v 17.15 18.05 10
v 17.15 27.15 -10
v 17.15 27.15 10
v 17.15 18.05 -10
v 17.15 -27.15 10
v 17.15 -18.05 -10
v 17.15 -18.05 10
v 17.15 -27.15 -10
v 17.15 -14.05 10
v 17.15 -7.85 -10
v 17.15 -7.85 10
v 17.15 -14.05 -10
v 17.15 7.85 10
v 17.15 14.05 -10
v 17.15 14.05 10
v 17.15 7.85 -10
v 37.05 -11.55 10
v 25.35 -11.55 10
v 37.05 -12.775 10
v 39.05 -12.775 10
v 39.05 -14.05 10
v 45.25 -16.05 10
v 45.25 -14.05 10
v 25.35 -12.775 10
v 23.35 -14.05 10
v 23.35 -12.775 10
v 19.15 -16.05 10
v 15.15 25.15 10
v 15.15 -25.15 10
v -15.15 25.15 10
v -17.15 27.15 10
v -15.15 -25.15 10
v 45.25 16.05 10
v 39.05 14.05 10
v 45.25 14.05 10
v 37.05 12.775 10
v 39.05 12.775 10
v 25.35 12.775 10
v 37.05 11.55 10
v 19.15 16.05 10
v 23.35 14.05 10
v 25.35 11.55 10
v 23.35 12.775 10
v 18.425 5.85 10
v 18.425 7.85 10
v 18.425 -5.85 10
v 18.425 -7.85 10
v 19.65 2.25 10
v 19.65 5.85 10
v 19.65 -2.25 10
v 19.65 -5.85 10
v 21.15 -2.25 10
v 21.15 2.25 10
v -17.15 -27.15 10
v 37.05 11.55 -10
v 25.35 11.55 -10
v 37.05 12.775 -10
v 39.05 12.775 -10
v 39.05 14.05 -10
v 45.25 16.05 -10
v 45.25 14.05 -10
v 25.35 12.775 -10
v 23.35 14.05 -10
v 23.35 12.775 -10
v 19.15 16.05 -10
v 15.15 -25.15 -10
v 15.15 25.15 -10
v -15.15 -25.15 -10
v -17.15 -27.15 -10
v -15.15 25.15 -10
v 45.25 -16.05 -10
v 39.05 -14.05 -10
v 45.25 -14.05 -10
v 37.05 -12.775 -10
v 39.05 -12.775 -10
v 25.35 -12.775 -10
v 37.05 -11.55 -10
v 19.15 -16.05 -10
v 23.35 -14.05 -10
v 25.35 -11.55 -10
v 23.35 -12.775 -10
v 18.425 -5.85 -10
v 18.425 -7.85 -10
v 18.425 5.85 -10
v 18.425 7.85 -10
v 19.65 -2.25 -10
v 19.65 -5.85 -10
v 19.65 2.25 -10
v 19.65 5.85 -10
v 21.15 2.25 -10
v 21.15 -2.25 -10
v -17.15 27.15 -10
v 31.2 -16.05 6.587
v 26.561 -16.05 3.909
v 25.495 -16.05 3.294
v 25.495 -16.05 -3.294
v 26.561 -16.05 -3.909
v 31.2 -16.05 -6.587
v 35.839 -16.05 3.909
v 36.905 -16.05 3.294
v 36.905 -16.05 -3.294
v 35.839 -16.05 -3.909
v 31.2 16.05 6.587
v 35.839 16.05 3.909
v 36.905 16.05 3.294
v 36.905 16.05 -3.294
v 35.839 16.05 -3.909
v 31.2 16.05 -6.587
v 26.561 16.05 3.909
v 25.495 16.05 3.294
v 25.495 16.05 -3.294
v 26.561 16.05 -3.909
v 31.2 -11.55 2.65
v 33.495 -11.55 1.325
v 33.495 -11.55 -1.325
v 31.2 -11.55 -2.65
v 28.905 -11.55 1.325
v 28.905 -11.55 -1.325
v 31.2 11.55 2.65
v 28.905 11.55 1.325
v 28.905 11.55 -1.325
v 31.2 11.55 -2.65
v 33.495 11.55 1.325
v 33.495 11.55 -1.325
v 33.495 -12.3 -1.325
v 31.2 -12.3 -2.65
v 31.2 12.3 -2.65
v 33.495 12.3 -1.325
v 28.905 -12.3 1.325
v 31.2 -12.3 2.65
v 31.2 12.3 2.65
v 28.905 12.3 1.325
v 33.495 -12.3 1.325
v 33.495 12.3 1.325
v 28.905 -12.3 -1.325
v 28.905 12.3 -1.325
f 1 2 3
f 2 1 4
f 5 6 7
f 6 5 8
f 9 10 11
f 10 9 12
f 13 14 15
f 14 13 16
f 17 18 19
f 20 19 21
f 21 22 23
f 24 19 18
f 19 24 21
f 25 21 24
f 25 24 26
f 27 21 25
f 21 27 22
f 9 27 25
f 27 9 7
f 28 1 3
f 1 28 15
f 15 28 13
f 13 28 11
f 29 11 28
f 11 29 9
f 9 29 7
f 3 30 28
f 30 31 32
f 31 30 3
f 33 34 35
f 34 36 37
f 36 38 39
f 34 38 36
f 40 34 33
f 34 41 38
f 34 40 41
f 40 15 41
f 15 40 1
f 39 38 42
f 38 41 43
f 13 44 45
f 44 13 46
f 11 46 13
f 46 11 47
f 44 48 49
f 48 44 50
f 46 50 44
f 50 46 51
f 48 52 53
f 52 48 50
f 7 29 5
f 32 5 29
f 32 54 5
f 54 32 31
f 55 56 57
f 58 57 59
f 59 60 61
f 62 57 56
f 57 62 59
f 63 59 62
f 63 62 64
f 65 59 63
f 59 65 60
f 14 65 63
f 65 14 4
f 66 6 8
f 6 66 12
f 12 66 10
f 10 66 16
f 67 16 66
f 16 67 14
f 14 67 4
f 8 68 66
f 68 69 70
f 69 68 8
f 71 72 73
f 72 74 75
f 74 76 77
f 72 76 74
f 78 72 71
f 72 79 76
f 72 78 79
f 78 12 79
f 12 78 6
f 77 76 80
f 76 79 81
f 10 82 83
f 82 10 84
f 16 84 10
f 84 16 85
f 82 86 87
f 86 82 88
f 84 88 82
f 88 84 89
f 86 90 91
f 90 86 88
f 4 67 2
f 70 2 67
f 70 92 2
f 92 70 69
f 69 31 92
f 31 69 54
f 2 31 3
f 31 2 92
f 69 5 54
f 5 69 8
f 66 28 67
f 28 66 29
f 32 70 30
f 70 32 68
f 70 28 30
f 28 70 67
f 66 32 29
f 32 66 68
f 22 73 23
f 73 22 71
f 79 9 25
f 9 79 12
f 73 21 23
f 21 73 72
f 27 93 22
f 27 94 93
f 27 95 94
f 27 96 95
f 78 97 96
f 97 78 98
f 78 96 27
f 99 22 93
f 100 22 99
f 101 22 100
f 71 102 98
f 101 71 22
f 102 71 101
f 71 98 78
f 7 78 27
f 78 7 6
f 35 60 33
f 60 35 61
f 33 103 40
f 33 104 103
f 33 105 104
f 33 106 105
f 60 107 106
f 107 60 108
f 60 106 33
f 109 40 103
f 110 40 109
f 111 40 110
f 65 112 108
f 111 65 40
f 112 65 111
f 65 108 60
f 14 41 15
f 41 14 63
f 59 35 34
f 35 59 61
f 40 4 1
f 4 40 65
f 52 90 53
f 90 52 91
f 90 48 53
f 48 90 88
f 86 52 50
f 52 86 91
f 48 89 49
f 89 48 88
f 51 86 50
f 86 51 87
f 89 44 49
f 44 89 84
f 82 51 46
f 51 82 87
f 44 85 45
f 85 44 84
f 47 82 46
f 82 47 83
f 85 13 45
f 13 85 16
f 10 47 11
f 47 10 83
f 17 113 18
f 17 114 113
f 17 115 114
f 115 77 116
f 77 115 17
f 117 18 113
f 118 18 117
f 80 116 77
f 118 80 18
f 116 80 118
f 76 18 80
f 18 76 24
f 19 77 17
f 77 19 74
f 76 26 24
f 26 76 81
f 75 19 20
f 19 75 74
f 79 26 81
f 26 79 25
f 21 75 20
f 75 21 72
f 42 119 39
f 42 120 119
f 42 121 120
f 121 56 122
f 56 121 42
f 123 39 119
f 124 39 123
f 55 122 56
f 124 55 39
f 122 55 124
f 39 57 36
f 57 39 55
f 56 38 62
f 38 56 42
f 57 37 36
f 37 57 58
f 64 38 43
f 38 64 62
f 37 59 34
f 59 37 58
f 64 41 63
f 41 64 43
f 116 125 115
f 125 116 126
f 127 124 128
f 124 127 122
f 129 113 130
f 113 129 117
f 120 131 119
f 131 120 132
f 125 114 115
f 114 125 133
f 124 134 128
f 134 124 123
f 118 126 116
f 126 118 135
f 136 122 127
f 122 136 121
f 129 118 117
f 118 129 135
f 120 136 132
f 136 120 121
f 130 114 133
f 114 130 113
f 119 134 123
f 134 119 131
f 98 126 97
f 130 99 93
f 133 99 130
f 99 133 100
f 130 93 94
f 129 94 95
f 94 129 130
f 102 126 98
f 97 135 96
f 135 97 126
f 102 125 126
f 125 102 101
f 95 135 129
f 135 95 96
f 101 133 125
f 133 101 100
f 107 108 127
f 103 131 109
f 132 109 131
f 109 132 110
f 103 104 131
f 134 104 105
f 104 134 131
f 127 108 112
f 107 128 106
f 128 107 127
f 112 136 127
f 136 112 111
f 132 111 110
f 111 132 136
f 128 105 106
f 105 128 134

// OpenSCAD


dim = [ 30, 50 ];
//dim = [ 38, 64 ];

c = 0.3;

w = dim[0]+c;
h = dim[1]+c;
l = 20;
t = 2;
b = 27.5+c*2;

difference()
{
	cube( [ w+t*2, h+t*2, l ], center = true );

	cube( [ w, h, l*2 ], center = true );
}

translate( [ w/2+t+b/2, 0, 0 ] )
difference()
{
	union()
	{
		for ( a = [ -1, +1 ] )
		{
			translate( [ 0, a*( b/2+t/2 ), 0 ] )
				cube( [ b, t, l ], center = true );
			translate( [ -b/2, a*( b/2+t ), 0 ] )
				cylinder( r = t, h = l, center = true, $fn = 4 );
		}

		for ( a = [ 0, 90, 270 ] ) rotate( [ 0, 0, a ] )
		{
			if ( a == 0 )
		translate( [ -b/2+1.5, 0, 0 ] )
			cube( [ 5, 4.5, l ], center = true );

		translate( [-b/2+0.75, 0, 0 ] )
			cube( [ 1+2.5, 12-c, l ], center = true );

		translate( [ -b/2+0.15, 0, 0 ] )
			cube( [ 1+1.25, 16-c, l ], center = true );
		}
	}

	//translate( [ w/2+t+3.5+2, 0, 0 ] )
	//	cube( [ 5.5, 10, 10 ], center = true );

	for ( a = [ 90, 270 ] ) rotate( [ 0, 0, a ] )
	{
		translate( [ -b/2-1, 0, 0 ] ) rotate( [ 0, 90, 0 ] )
			cylinder( r = 2.65, h = 40, center = true, $fn = 6 );

		translate( [ -b/2-1.75, 0, 0 ] ) rotate( [ 0, 90, 0 ] )
			cylinder( r2 = 2.65, r1 = 10, h = 7, center = true, $fn = 6 );
	}
}
